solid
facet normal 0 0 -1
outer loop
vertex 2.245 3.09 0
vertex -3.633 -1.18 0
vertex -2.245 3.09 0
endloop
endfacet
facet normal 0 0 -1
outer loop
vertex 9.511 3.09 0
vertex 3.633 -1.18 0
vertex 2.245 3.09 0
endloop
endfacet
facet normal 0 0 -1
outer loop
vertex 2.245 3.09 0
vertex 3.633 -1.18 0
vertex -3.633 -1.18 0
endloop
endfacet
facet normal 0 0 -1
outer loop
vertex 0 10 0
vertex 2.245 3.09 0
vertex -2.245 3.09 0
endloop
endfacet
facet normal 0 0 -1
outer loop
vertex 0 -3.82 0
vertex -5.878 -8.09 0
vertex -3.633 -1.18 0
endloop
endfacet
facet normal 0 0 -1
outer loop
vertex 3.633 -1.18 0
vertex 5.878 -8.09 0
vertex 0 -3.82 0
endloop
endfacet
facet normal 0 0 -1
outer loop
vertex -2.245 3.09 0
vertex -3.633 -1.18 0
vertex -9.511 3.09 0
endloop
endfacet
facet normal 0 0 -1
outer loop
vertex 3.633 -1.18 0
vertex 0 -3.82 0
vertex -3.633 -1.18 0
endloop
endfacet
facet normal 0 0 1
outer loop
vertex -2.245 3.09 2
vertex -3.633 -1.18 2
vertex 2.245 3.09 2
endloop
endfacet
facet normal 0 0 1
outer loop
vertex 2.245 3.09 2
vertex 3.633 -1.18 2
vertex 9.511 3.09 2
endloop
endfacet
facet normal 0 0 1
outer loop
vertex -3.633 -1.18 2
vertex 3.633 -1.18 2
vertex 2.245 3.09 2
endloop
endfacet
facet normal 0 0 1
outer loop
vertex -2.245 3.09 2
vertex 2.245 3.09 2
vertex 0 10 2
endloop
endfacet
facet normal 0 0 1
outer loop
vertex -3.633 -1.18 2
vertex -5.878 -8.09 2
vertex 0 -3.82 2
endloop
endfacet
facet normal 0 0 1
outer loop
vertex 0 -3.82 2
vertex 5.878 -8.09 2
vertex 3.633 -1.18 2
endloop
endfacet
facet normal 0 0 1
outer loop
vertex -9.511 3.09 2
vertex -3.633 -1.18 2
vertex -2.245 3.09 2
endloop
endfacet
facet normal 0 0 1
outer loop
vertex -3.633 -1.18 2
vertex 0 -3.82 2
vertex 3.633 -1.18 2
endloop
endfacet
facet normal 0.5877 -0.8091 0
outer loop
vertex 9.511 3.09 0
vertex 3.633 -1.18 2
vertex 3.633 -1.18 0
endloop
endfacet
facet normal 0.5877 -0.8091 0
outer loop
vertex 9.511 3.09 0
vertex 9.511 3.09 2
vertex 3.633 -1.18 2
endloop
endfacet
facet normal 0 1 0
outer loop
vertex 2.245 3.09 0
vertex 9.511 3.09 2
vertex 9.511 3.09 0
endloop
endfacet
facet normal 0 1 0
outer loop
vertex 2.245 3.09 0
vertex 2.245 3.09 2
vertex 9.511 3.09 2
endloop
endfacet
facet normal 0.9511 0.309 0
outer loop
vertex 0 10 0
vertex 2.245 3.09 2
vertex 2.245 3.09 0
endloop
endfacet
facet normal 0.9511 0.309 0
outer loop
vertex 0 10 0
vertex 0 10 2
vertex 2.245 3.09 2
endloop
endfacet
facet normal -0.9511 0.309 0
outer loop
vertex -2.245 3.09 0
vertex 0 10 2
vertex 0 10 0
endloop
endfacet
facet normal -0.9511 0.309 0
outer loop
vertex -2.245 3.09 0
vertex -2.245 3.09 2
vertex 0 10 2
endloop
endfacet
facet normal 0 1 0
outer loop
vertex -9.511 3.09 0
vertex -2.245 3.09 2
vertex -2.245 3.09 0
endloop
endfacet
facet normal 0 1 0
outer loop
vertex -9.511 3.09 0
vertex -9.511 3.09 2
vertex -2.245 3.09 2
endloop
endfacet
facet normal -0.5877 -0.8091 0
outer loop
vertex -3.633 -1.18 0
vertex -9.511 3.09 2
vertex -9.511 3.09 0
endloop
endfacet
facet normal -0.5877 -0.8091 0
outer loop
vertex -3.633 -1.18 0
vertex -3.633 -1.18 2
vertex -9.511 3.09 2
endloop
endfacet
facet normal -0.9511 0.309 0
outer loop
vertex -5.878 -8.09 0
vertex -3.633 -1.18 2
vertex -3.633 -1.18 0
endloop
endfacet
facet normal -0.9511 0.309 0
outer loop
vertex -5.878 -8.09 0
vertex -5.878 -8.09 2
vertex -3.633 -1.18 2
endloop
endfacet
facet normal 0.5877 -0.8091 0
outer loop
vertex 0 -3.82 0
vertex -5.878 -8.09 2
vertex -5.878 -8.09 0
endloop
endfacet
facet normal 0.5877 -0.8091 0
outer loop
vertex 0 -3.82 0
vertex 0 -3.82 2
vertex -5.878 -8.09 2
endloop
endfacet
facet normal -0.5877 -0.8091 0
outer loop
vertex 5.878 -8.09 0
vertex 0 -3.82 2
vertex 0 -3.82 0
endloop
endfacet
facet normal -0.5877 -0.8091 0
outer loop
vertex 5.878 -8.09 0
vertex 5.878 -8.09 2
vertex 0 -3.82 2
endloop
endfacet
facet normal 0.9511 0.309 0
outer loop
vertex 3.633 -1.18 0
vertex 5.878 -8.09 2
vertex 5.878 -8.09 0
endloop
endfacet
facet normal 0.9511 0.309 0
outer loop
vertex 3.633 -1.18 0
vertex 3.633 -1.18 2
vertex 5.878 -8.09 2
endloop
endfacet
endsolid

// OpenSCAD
// 5-pointed star with solid infill - animated
// Outer radius R, inner radius r = R * sin(18) / sin(54)
// To animate: View → Animate, set FPS=60, Steps=120 (2 sec duration)

R = 10; // outer radius

// Calculate inner radius using the golden ratio proportion
r = R * sin(18) / sin(54);

function star_point(i, R, r) =
    i % 2 == 0
        ? [R * cos(90 - i * 36), R * sin(90 - i * 36)]
        : [r * cos(90 - i * 36), r * sin(90 - i * 36)];

points = [for (i = [0:9]) star_point(i, R, r)];

color("#ffff00")
rotate([0, 360 * $t, 0])
scale(1 - $t * 0.999)
    linear_extrude(height = 2)
        polygon(points);
